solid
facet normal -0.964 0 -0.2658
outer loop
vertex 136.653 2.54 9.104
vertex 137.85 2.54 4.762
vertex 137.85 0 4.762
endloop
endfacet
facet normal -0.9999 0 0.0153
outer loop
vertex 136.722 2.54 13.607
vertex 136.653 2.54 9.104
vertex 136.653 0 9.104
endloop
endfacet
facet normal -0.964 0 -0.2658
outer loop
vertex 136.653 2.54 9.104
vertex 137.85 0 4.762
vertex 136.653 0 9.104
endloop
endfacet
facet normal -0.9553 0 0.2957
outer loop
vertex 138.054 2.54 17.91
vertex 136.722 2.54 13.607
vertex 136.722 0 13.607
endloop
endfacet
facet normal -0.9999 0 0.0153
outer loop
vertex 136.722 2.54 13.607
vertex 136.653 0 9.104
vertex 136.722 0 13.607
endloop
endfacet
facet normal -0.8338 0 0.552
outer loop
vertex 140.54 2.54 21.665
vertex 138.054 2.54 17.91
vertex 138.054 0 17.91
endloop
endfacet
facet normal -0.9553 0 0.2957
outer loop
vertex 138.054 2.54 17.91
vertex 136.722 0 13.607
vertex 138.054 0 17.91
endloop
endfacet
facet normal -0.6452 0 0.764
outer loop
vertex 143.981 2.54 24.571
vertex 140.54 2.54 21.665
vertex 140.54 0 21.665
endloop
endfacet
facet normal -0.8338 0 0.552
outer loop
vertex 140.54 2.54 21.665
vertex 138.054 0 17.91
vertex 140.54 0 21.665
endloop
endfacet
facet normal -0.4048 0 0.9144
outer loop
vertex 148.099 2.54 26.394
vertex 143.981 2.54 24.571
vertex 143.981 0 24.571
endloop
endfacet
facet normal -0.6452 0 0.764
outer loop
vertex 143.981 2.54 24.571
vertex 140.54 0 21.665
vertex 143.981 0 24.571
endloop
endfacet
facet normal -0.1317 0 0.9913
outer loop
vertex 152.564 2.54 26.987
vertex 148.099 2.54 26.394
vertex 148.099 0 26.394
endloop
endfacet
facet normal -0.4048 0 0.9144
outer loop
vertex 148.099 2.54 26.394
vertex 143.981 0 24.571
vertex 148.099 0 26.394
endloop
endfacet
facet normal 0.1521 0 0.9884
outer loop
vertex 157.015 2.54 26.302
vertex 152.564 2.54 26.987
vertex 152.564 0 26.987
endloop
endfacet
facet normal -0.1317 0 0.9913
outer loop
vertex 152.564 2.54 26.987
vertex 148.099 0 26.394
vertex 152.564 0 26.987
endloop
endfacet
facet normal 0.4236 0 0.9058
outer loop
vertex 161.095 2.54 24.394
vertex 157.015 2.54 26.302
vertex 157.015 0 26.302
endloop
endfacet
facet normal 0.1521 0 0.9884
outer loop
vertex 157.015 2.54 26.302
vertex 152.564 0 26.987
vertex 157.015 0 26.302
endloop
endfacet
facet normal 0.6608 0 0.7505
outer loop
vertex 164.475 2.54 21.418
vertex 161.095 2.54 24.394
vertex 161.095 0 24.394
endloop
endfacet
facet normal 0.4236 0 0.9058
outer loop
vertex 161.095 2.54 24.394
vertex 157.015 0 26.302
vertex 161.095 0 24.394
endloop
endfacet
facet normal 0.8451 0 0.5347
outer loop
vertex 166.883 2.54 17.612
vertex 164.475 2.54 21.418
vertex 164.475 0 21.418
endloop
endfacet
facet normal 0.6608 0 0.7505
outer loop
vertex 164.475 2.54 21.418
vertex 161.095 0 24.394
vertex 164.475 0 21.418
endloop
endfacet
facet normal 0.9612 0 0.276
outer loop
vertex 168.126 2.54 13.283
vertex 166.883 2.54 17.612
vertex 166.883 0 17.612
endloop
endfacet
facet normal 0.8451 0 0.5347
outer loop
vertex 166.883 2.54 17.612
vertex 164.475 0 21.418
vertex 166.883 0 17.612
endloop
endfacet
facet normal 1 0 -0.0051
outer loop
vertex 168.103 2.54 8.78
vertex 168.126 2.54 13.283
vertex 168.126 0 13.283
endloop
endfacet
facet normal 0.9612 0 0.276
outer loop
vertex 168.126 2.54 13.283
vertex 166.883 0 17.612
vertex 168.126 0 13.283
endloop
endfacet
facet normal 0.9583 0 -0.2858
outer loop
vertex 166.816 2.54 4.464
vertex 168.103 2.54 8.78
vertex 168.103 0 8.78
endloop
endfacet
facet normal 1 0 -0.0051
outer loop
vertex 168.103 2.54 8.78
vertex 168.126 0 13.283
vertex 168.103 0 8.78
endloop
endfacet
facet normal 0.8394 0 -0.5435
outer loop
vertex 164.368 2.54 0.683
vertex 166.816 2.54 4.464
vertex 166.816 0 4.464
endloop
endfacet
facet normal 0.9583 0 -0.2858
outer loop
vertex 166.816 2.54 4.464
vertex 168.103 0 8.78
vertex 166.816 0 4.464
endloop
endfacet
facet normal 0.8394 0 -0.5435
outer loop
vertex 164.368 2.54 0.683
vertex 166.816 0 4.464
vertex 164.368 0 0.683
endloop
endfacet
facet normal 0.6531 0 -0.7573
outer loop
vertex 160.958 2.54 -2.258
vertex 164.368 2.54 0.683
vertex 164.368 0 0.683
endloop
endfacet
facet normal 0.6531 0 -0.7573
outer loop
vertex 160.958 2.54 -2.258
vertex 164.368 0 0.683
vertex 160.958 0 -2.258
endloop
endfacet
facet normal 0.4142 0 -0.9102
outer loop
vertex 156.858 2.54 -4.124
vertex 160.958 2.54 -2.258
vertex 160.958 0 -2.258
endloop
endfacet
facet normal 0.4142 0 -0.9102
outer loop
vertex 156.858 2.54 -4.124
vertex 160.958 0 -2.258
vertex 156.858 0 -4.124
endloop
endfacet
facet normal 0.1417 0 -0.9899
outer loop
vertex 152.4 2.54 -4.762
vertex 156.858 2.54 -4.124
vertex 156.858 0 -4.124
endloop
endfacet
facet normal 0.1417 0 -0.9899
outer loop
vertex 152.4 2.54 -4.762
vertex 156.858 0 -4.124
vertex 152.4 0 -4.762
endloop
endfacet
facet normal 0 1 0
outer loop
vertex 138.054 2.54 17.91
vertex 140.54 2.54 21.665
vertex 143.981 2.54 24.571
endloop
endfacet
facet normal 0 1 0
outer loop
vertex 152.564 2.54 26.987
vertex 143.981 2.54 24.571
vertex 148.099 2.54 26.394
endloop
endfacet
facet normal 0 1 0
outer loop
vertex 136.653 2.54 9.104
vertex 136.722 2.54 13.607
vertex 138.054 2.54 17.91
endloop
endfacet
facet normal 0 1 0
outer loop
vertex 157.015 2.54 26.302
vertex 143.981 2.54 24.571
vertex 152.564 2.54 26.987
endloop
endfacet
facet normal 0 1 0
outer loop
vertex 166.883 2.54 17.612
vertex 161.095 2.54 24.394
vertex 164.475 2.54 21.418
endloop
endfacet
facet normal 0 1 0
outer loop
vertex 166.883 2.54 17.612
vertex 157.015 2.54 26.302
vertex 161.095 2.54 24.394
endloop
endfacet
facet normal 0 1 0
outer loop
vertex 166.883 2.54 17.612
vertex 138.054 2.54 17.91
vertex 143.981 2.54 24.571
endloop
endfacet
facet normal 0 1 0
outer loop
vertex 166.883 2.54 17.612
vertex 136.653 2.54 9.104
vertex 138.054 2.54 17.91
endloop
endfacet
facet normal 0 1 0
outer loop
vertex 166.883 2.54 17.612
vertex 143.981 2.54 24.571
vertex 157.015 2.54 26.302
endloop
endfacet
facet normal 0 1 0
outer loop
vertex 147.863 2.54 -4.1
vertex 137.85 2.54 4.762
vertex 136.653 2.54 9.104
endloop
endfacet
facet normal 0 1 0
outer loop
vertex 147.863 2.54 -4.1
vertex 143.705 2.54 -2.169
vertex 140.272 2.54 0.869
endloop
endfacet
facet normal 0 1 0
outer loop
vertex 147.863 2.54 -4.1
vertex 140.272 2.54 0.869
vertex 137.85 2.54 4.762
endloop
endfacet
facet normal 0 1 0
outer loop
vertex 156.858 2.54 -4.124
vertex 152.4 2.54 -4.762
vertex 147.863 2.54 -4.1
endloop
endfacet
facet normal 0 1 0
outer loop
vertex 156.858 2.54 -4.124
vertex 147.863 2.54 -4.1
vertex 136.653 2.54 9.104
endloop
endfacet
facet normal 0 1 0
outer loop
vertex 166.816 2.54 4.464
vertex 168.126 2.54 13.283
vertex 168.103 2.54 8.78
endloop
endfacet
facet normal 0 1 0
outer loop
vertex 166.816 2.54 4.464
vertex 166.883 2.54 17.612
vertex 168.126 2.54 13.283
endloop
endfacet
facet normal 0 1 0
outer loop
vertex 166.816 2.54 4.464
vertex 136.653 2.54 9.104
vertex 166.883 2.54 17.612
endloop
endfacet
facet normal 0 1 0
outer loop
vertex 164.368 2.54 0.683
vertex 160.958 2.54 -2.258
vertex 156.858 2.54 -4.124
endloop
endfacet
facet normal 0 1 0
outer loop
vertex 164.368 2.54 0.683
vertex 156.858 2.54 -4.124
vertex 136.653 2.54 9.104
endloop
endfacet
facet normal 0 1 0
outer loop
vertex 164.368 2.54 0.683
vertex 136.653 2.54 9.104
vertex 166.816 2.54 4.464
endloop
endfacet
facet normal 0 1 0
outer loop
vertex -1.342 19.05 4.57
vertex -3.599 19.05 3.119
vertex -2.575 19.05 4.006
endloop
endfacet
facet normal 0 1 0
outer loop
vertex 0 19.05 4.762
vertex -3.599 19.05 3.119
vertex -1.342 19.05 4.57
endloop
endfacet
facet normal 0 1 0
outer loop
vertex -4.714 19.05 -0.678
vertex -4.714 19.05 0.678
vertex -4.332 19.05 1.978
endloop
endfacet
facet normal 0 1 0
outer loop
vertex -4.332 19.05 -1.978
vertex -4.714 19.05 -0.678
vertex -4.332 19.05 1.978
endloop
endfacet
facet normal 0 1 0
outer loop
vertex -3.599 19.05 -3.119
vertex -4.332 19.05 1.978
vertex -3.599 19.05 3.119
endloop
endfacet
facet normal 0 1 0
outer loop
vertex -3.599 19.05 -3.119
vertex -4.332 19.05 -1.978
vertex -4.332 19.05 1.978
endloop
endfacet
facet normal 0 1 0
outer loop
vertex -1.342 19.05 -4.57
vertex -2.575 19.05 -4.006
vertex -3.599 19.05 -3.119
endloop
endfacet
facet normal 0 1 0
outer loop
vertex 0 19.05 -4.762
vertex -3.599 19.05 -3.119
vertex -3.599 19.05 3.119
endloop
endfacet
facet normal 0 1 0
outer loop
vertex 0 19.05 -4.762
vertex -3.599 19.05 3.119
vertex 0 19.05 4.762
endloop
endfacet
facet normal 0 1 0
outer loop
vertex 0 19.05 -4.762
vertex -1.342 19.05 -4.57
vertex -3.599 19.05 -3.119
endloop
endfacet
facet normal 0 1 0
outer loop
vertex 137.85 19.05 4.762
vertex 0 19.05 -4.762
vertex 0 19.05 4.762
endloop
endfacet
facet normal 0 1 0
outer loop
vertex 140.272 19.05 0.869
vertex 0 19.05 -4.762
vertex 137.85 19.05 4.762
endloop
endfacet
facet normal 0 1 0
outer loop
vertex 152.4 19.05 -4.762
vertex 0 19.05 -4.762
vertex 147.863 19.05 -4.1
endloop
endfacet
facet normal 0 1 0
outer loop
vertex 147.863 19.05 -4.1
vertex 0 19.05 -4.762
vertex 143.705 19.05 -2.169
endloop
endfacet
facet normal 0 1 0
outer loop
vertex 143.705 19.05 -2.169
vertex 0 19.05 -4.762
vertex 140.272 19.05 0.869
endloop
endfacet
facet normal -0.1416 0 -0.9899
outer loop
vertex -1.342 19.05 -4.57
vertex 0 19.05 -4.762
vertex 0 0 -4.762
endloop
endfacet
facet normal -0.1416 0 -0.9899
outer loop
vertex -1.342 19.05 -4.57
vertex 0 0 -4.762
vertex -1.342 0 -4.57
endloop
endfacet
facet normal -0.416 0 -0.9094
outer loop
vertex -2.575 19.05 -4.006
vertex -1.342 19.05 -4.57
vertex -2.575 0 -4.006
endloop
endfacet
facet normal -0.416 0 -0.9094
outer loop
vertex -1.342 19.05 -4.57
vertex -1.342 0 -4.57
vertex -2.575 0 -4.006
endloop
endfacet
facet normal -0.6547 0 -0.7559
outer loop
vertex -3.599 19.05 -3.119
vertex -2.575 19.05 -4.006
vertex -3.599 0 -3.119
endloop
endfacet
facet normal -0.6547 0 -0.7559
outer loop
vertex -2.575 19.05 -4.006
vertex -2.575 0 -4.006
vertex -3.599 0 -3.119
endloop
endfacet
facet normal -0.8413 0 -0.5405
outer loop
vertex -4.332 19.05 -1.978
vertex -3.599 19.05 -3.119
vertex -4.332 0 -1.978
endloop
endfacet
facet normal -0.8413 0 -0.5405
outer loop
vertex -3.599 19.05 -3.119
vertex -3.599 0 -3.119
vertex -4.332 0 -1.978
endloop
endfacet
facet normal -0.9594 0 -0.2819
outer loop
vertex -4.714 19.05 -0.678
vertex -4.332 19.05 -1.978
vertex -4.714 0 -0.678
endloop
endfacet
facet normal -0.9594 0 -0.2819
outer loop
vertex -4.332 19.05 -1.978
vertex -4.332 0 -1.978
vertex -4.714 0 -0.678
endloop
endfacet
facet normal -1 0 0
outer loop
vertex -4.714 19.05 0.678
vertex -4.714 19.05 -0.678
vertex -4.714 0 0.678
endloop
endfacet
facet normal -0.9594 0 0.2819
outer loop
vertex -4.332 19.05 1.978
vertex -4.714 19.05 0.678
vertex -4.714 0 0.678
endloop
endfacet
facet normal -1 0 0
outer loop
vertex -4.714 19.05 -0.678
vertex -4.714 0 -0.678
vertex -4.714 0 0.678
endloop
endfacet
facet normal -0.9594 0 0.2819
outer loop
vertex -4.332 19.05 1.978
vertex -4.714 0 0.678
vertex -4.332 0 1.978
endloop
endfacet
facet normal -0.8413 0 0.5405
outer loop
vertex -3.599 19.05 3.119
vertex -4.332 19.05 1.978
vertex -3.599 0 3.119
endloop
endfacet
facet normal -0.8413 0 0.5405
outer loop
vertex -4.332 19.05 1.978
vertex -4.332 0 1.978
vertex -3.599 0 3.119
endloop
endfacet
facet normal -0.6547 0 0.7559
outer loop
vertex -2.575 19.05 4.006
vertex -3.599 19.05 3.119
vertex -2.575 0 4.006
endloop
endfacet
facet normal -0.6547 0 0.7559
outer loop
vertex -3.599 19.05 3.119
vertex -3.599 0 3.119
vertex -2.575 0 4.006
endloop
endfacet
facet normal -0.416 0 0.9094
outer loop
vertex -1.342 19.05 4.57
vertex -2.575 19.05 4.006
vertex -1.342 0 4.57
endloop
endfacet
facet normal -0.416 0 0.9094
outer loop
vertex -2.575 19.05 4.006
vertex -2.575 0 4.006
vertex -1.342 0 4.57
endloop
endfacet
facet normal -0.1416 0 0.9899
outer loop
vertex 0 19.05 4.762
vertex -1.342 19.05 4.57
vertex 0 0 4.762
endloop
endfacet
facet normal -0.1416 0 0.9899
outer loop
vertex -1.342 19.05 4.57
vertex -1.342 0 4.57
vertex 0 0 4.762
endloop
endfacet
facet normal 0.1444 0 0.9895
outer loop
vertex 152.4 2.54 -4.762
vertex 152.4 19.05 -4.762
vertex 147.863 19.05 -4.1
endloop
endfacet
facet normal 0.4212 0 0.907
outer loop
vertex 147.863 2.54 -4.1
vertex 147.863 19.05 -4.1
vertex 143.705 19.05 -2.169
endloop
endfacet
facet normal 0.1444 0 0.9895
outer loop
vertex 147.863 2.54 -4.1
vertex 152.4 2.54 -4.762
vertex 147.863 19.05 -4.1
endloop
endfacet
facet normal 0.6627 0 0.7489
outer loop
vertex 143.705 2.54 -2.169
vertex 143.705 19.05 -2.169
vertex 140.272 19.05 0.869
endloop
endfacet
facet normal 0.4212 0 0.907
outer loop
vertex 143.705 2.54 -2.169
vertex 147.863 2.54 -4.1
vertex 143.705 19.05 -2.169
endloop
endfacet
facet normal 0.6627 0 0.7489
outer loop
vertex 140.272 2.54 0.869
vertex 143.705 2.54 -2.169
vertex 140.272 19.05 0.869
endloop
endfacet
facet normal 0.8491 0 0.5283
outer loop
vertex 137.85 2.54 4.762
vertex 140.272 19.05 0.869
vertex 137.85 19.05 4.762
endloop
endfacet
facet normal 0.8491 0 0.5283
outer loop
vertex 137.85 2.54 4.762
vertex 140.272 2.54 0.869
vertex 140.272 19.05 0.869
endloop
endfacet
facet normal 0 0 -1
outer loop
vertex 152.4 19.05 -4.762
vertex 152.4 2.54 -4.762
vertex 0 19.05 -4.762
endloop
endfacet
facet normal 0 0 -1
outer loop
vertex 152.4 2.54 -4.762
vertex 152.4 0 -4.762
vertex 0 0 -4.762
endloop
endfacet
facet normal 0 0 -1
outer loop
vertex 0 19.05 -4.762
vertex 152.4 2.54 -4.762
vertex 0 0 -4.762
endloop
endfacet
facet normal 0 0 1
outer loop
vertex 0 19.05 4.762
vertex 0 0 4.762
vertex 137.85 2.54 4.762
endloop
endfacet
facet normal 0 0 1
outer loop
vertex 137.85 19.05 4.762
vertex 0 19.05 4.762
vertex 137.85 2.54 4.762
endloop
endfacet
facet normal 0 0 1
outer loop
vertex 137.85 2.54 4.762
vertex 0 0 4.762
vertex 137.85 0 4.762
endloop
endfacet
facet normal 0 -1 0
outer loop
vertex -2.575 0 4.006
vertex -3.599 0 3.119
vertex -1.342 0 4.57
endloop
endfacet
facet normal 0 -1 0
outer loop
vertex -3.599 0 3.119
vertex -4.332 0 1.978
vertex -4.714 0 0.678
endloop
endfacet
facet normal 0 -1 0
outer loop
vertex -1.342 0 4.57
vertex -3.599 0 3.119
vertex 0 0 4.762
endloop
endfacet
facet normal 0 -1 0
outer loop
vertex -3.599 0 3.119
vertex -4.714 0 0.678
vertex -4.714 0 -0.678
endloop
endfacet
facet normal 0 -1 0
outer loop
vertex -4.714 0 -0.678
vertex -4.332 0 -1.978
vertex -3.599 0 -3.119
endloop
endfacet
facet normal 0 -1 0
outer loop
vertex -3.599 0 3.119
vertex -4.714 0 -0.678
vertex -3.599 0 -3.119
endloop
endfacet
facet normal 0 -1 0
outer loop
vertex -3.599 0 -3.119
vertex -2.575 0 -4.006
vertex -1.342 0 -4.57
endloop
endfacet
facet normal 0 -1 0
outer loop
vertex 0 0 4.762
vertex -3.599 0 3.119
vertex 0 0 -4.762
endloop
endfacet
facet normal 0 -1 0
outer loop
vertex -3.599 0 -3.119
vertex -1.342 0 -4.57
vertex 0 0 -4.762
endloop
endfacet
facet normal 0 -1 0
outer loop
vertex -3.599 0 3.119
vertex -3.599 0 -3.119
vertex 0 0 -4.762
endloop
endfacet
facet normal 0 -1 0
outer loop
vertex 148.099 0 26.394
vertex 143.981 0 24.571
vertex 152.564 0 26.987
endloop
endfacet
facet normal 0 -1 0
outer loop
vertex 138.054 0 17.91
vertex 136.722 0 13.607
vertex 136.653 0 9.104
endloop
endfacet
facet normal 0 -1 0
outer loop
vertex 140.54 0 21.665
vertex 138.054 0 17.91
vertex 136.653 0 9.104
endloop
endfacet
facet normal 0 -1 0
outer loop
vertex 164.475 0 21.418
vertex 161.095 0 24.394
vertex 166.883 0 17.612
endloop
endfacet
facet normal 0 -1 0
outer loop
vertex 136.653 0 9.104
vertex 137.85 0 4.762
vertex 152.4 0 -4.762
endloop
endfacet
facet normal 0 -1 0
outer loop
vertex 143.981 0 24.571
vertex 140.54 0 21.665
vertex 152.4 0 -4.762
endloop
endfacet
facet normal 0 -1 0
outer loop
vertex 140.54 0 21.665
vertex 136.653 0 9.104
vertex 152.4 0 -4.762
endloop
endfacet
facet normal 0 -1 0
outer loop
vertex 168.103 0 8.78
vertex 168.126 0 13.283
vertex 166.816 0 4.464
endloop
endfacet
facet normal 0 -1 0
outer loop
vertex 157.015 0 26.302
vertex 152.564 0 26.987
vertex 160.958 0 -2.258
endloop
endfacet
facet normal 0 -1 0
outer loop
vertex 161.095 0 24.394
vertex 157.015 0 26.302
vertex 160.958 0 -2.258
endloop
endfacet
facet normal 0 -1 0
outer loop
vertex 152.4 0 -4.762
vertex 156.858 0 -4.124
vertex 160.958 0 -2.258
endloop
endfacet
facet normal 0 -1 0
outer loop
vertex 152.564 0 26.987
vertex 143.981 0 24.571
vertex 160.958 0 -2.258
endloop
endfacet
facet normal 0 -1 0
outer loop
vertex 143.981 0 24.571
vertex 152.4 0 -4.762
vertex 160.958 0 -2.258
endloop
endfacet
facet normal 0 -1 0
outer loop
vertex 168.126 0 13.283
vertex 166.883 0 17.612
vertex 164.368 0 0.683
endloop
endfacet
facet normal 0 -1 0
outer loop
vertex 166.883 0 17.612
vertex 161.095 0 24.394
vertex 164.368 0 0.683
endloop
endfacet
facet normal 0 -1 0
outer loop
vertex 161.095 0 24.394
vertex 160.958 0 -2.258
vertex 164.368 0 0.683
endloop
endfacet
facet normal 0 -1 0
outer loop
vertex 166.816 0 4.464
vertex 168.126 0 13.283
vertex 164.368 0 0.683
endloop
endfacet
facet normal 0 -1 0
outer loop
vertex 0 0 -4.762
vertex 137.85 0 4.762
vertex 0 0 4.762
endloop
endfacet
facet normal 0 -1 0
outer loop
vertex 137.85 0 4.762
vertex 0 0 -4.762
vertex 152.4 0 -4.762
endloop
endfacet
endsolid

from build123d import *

# Parameters (mm, degrees)
BOSS_EXTRUDE1_DEPTH = 19.05
CUT_EXTRUDE1_START  = -16.51
SKETCH2_R           = 15.875
CUT_EXTRUDE1_DEPTH  = 16.51


with BuildPart() as part:
    # Sketch1 → Boss-Extrude1 (new body)
    with BuildSketch(Plane(origin=(0, 0, 0), x_dir=(1, 0, 0), z_dir=(0, 1, 0))):
        with BuildLine():
            Line((0, -4.7625), (137.850322169, -4.7625))
            ThreePointArc((137.850322169, -4.7625), (161.0950956, -24.394477921), (152.4, 4.7625))
            Line((152.4, 4.7625), (0, 4.7625))
            ThreePointArc((0, 4.7625), (-4.7625, 0), (0, -4.7625))
        make_face()
    extrude(amount=BOSS_EXTRUDE1_DEPTH)

    # Sketch2 → Cut-Extrude1 (cut)
    with BuildSketch(Plane(origin=(0, 19.05, 0), x_dir=(1, 0, 0), z_dir=(0, 1, 0)).offset(CUT_EXTRUDE1_START)):
        with Locations((152.4, -11.1125)):
            Circle(SKETCH2_R)
    extrude(amount=CUT_EXTRUDE1_DEPTH, mode=Mode.SUBTRACT)


solid = part.part
